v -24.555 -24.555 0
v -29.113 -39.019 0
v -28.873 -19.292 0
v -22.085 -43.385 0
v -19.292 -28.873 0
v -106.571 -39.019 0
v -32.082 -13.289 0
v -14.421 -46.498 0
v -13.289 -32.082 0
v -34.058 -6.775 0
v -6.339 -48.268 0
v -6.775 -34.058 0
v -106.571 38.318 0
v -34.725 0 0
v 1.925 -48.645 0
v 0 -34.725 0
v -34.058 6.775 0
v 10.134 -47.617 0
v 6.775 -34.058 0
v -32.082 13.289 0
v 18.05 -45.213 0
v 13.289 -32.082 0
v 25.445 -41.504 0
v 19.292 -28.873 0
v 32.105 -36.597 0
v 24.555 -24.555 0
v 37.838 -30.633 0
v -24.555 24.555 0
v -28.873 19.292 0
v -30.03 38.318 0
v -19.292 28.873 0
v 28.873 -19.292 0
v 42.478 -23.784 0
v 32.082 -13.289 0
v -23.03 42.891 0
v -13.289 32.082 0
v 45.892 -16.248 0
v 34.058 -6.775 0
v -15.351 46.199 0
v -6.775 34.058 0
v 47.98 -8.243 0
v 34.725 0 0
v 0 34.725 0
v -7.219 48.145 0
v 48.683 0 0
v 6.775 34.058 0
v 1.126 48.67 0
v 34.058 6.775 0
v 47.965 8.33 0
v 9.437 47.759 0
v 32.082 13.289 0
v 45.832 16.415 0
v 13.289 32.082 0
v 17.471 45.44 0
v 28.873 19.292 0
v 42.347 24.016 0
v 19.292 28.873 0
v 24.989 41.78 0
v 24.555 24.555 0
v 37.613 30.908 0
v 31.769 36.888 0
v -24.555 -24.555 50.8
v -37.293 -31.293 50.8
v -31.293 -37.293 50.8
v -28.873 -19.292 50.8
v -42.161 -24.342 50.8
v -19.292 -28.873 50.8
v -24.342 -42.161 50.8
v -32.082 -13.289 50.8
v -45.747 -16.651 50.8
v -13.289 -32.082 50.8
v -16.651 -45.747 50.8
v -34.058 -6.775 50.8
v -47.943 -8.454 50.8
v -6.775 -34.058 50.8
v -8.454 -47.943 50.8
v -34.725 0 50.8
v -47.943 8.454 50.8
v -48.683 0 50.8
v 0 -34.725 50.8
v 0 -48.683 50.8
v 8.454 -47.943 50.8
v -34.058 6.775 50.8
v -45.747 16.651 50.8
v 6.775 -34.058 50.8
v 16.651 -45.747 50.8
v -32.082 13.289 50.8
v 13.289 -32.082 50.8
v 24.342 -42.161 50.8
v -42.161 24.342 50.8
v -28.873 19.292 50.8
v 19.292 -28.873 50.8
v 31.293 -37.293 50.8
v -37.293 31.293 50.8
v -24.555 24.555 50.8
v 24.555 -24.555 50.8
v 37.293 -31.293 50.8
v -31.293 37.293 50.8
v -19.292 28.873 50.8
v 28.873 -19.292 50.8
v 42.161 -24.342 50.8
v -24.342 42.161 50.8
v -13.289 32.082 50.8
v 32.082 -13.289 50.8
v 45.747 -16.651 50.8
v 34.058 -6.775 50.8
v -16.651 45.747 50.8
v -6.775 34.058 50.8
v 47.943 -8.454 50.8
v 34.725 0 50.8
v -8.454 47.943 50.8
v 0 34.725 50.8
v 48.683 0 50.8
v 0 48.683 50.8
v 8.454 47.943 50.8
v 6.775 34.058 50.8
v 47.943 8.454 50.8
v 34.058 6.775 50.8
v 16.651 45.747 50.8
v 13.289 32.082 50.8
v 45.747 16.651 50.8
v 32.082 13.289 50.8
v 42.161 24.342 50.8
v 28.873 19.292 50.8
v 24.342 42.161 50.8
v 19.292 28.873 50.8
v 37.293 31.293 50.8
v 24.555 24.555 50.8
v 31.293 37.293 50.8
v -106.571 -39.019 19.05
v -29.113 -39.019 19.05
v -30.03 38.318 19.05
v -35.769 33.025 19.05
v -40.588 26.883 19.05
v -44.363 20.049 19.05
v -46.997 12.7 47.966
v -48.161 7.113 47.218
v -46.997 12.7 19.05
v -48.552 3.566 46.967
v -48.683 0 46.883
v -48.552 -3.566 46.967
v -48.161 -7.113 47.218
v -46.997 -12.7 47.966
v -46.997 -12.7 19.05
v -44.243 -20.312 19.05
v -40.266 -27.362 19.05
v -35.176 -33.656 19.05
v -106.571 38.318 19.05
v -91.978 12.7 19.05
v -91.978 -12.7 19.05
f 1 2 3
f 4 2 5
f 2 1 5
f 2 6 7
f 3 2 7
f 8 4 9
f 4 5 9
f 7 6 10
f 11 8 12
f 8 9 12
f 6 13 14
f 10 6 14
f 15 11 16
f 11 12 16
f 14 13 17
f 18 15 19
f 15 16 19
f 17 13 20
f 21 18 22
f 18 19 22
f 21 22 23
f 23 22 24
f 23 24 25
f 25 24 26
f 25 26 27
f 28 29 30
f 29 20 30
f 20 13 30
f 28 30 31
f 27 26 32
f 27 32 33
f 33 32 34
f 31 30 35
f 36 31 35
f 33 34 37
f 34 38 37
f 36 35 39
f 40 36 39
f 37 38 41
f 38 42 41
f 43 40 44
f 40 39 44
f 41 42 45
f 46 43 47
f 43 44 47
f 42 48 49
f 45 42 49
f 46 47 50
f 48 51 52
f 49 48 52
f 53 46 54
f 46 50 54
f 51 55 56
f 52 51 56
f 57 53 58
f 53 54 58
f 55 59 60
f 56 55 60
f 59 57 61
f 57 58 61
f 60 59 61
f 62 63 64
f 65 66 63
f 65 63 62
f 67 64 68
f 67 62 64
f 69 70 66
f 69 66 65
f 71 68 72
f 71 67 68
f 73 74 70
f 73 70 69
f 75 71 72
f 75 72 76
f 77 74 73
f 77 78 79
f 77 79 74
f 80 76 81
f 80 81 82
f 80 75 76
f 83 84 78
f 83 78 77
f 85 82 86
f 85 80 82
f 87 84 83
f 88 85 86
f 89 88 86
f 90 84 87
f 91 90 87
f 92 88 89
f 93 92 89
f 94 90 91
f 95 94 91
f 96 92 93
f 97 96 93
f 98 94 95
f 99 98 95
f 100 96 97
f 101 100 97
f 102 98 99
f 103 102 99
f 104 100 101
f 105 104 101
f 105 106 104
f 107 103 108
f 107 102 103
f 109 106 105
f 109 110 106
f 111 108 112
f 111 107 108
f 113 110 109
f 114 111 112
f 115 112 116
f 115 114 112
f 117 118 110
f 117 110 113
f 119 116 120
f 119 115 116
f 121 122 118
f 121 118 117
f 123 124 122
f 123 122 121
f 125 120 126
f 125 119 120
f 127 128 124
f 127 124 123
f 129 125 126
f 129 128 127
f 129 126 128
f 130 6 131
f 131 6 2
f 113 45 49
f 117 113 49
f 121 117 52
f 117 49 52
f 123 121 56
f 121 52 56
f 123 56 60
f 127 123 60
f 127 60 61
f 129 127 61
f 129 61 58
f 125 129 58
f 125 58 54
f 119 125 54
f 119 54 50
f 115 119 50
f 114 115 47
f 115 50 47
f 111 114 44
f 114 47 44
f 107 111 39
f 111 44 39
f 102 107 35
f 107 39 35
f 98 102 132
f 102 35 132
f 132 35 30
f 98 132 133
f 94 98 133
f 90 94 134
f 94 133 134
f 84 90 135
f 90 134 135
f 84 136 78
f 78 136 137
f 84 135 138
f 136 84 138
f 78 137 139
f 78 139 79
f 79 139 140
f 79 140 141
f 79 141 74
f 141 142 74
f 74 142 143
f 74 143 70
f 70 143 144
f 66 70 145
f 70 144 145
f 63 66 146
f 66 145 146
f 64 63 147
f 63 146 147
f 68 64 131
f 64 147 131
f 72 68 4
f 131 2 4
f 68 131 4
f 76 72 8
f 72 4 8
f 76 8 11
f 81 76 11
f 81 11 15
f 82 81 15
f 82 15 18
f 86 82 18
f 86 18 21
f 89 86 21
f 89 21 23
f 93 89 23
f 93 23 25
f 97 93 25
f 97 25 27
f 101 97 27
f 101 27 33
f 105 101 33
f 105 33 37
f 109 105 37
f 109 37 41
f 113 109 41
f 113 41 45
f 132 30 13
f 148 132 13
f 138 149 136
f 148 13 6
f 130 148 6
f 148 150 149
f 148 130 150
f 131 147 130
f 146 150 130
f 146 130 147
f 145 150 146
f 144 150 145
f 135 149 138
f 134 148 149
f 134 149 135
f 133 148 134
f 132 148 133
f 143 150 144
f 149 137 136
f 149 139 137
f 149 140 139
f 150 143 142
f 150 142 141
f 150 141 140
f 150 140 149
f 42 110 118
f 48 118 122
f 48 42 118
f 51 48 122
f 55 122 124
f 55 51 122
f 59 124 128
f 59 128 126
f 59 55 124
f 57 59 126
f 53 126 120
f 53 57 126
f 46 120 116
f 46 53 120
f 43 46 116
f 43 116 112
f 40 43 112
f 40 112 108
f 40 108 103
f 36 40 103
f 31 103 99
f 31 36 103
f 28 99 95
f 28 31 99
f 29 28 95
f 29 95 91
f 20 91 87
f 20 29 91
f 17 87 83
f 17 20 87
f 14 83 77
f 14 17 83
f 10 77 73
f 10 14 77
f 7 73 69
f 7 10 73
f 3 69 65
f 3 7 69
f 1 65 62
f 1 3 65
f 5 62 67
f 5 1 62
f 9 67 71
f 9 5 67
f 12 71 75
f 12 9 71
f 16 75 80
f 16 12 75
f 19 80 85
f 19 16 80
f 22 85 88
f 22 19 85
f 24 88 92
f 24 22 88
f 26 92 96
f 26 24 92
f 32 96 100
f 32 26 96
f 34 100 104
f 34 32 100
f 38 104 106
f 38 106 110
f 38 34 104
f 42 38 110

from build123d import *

# Parameters (mm, degrees)
F0_R          = 48.683007
F0_R_2        = 34.725428
F1_DEPTH      = 50.8
F3_DEPTH      = 19.05
F5_DEPTH      = 12.7
F5_DEPTH_BACK = 12.7


with BuildPart() as f1:
    # F0 (on Top) → F1 (new body)
    with BuildSketch(Plane.XY):
        Circle(F0_R)
        Circle(F0_R_2, mode=Mode.SUBTRACT)
    extrude(amount=F1_DEPTH)

    # F2 (on Top) → F3 (join)
    with BuildSketch(Plane.XY):
        with BuildLine():
            ThreePointArc((-12.464464, -39.019189), (-40.947813, -1.066114), (-14.478001, 38.317718))
            Line((-14.478001, 38.317718), (-106.571145, 38.317718))
            Line((-106.571145, 38.317718), (-106.571145, -39.019189))
            Line((-106.571145, -39.019189), (-12.464464, -39.019189))
        make_face()
    extrude(amount=F3_DEPTH)

    # F4 (on Front) → F5 (join, two sides)
    with BuildSketch(Plane.XZ) as f5_sk:
        Polygon((-46.427574, 16.981715), (-46.427574, 48.332572), (-95.195569, 16.981715), align=None)
    extrude(amount=F5_DEPTH)
    extrude(f5_sk.sketch, amount=-F5_DEPTH_BACK)


solid = f1.part
